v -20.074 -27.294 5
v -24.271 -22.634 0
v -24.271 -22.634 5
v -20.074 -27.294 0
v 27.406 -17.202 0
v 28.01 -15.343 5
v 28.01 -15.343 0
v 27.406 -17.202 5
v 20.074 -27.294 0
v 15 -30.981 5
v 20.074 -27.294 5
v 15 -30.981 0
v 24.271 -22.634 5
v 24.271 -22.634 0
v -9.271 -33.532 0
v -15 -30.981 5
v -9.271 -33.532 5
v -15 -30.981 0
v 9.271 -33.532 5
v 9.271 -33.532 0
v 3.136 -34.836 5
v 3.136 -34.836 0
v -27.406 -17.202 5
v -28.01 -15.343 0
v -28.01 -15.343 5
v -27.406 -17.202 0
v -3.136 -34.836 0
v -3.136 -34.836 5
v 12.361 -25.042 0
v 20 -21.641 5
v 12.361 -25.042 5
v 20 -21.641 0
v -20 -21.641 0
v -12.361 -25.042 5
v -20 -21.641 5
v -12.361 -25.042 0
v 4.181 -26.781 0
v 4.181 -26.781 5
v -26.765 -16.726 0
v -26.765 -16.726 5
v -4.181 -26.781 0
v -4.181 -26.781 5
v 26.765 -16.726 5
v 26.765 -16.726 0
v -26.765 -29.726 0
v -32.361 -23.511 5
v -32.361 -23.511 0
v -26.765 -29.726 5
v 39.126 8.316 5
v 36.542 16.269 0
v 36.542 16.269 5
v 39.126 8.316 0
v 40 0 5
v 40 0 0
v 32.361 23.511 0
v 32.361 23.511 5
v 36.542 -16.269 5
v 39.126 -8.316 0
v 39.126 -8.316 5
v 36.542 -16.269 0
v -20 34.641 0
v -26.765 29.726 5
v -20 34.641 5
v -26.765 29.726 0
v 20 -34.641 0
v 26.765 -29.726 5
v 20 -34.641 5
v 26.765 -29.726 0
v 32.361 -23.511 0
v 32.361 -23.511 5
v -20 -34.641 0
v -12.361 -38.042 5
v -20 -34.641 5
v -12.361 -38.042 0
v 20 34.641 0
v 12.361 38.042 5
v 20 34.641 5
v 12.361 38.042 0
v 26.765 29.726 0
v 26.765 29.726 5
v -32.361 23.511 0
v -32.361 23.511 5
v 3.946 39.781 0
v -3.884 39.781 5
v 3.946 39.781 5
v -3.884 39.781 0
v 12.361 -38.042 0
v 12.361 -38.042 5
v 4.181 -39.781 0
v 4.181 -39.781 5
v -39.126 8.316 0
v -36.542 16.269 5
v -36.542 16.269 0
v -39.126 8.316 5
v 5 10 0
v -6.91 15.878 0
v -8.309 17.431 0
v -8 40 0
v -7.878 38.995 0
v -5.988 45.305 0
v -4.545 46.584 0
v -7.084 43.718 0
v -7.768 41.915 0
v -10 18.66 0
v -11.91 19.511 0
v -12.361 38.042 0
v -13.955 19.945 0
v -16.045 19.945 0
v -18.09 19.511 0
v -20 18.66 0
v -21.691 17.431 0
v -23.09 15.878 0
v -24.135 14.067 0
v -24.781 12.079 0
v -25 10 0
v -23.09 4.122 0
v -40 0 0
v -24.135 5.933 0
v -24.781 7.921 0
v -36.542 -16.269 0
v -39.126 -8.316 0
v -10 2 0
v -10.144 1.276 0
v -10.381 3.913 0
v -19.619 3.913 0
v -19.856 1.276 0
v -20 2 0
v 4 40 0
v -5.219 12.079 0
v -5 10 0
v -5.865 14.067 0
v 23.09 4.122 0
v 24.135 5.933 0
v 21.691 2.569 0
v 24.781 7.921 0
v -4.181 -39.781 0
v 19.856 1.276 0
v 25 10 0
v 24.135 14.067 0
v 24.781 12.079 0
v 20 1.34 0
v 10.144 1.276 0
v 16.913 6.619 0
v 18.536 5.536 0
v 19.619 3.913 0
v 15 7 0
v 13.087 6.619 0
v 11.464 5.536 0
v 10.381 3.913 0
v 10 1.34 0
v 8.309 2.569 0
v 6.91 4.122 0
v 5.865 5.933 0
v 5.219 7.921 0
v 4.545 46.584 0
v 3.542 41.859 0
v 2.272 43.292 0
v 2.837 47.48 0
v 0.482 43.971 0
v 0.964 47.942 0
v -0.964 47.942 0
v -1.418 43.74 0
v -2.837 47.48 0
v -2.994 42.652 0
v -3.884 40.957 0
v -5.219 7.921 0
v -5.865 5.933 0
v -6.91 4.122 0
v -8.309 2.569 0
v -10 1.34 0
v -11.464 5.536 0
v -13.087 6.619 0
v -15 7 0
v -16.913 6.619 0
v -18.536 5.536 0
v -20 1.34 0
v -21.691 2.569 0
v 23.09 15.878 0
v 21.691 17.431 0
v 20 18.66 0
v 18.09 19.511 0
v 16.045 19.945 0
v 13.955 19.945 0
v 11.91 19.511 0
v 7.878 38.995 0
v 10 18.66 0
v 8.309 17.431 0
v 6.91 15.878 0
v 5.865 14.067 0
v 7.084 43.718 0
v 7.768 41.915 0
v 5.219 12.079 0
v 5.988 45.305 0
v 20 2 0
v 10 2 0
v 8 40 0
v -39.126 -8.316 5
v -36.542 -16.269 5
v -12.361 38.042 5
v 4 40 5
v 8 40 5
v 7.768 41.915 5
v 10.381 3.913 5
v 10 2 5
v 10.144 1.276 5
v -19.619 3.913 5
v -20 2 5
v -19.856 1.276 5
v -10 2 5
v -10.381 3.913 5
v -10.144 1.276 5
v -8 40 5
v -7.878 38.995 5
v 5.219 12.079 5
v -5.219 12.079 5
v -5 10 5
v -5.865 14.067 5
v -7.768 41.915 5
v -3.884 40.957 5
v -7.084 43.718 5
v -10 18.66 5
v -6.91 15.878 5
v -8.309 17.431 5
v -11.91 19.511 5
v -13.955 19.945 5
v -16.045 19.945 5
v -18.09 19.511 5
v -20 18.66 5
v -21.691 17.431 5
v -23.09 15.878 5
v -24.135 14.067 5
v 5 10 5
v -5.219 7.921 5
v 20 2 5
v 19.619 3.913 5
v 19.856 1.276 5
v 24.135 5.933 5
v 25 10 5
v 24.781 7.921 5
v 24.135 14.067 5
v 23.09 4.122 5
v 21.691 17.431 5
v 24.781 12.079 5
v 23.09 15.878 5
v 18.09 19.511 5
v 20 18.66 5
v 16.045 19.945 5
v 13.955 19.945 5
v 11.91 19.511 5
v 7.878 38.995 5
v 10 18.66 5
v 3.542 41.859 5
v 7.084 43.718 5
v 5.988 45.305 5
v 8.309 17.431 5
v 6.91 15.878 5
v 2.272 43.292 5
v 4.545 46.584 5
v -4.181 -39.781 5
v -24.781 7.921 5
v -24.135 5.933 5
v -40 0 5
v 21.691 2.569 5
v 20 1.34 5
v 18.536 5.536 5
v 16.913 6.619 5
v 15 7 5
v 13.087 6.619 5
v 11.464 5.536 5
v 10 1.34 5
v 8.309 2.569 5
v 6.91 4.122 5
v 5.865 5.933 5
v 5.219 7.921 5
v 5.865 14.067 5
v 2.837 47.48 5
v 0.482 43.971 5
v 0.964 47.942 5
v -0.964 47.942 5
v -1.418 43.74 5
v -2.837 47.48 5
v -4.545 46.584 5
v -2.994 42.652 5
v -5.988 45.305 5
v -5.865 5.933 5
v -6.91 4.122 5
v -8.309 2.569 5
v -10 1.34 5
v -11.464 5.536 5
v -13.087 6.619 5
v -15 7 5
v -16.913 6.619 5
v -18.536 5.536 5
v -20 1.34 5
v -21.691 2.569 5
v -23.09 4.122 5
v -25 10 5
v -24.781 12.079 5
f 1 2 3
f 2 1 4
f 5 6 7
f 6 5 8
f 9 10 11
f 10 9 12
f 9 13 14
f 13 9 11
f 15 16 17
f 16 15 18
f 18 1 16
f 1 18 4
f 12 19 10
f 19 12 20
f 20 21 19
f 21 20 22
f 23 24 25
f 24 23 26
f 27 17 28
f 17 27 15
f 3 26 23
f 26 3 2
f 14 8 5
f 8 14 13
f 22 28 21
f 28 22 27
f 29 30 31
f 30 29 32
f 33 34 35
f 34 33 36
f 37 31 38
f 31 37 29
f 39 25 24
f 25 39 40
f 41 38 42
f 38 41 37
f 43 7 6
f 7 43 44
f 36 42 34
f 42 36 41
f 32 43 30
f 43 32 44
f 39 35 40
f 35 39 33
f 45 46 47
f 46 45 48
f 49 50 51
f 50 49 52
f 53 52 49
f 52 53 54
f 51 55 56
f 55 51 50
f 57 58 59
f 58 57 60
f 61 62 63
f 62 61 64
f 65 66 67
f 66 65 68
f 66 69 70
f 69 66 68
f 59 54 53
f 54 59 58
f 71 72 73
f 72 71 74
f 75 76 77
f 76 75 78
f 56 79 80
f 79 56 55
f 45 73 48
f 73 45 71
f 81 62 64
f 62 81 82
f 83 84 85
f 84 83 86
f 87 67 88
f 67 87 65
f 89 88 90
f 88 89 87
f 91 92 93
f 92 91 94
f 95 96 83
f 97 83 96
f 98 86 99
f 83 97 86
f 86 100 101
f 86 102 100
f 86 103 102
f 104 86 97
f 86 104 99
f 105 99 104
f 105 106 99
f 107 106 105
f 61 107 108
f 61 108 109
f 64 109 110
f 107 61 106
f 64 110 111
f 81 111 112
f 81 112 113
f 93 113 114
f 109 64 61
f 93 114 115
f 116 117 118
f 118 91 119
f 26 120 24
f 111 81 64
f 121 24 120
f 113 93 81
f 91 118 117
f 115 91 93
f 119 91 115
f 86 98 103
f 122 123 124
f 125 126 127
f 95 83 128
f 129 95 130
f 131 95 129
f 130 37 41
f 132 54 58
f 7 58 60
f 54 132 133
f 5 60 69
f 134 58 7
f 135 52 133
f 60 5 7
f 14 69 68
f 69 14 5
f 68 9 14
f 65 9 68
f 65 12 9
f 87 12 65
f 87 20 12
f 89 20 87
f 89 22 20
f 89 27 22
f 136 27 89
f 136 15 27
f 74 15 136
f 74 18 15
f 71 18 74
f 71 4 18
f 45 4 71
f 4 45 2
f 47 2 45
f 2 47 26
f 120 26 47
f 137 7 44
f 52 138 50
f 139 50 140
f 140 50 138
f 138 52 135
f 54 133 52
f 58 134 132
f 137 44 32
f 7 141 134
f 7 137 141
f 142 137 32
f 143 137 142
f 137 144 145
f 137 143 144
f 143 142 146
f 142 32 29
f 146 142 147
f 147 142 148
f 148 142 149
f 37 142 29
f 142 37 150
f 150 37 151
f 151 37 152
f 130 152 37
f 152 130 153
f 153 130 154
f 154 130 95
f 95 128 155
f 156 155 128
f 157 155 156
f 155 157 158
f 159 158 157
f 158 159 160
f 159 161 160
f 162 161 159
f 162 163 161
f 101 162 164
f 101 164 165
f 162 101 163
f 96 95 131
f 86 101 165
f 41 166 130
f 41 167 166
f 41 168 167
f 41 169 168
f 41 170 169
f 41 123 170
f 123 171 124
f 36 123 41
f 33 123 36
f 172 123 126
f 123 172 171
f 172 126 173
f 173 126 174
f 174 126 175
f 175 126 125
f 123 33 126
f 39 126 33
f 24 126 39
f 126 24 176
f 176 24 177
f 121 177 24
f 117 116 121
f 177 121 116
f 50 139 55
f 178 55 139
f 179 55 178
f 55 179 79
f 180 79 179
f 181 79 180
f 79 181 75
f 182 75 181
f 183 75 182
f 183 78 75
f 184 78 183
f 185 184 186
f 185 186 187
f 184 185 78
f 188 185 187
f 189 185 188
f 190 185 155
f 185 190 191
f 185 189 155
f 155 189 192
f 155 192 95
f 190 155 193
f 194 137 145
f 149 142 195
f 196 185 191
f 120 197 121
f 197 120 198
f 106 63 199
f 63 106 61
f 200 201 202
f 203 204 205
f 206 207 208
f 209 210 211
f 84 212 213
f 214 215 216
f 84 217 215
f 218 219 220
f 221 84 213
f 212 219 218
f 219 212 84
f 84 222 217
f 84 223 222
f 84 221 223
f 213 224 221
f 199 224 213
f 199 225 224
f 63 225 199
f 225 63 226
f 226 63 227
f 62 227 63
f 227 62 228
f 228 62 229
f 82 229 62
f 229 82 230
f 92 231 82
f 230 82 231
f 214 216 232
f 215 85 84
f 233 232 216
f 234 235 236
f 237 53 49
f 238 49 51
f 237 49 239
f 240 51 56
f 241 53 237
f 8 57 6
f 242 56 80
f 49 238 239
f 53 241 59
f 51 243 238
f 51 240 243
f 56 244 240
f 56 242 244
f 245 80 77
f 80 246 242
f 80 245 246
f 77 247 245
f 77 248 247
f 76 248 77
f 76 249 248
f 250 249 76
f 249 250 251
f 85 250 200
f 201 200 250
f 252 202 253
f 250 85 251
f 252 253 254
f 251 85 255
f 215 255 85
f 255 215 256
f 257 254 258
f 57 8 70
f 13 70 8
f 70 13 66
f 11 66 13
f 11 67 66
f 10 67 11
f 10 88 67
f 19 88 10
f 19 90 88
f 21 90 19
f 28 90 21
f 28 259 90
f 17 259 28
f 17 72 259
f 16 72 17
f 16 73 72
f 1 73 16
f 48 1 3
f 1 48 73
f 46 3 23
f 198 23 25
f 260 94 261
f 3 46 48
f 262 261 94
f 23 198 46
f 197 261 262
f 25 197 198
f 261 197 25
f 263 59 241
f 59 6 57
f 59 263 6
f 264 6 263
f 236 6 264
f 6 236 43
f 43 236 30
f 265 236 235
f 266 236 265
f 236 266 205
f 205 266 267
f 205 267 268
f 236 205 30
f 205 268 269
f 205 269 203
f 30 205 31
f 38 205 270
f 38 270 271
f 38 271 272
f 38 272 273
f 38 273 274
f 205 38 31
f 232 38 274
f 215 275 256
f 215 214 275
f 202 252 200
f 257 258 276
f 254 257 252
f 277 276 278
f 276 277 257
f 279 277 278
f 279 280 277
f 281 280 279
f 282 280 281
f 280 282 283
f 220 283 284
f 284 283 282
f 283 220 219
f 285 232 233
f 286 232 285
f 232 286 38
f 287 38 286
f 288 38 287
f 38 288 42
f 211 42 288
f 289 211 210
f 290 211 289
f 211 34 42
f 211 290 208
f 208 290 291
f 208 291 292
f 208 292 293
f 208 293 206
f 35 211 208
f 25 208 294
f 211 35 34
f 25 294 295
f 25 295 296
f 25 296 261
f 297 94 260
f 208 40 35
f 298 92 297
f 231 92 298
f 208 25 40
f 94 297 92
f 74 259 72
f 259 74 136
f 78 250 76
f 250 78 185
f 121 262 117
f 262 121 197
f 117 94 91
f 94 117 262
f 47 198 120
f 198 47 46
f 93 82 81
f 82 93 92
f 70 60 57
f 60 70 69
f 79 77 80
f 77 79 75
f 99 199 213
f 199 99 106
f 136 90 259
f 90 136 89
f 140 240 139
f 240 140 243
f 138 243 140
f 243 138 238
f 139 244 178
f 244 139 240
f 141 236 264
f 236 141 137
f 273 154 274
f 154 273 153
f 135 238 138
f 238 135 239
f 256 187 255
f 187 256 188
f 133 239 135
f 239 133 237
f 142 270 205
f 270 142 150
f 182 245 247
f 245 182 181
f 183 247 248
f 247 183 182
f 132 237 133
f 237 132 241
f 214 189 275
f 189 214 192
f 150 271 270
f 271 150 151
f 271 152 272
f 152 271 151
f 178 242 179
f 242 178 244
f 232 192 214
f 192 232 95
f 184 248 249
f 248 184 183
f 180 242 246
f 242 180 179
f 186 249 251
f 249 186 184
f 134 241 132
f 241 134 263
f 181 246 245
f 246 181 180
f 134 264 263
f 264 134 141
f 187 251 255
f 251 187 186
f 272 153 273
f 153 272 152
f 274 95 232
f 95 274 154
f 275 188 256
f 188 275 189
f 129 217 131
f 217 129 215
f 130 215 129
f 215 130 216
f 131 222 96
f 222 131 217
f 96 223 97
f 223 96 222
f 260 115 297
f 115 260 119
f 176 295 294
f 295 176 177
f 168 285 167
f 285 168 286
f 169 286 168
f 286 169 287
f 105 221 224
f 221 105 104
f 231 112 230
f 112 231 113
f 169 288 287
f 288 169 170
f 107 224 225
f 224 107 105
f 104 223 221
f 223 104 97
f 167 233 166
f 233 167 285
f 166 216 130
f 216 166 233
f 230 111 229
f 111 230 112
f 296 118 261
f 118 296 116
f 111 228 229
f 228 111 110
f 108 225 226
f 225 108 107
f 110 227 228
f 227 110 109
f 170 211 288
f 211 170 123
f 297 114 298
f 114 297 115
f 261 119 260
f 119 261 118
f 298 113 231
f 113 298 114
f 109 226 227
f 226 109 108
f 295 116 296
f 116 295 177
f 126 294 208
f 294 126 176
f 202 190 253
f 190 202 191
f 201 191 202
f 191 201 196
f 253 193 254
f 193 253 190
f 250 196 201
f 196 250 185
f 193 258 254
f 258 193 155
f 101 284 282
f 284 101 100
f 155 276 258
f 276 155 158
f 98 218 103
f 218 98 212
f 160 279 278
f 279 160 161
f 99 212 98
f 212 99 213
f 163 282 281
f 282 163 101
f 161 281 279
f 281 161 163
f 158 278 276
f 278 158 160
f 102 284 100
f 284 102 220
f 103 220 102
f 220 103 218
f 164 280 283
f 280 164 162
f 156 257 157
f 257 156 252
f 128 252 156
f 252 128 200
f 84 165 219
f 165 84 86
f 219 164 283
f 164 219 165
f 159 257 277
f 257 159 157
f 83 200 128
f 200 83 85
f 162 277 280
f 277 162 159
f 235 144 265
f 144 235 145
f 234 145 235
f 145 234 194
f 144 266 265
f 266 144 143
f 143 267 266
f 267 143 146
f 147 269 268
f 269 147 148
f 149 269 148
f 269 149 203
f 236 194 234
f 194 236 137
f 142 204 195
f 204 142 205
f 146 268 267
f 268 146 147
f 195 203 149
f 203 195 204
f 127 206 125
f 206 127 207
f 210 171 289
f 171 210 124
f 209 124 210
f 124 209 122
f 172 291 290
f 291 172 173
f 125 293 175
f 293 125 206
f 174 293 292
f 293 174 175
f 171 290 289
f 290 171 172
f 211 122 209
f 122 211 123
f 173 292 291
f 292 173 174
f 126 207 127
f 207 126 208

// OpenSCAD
// 3D Shapes- Smiley Face

// face
difference() {
    cylinder(h=5, r=40);
    
    translate([15, 10, -1]) cylinder(h=7, r=10);
    translate([-15, 10, -1]) cylinder(h=7, r=10);
    
    // mouth
    difference() {
      translate([0, -5, -1]) cylinder(h=7, r=30);
      translate([0, 13, -2]) cylinder(h=9, r=40);
    }
}

// eyes
translate([15, 2, 0]) cylinder(h=5, r=5);
translate([-15, 2, 0]) cylinder(h=5, r=5);

// loop
translate([0, 40, 0]) difference() {
    cylinder(h=5, r=8);
    cylinder(h=5, r=4);
}
